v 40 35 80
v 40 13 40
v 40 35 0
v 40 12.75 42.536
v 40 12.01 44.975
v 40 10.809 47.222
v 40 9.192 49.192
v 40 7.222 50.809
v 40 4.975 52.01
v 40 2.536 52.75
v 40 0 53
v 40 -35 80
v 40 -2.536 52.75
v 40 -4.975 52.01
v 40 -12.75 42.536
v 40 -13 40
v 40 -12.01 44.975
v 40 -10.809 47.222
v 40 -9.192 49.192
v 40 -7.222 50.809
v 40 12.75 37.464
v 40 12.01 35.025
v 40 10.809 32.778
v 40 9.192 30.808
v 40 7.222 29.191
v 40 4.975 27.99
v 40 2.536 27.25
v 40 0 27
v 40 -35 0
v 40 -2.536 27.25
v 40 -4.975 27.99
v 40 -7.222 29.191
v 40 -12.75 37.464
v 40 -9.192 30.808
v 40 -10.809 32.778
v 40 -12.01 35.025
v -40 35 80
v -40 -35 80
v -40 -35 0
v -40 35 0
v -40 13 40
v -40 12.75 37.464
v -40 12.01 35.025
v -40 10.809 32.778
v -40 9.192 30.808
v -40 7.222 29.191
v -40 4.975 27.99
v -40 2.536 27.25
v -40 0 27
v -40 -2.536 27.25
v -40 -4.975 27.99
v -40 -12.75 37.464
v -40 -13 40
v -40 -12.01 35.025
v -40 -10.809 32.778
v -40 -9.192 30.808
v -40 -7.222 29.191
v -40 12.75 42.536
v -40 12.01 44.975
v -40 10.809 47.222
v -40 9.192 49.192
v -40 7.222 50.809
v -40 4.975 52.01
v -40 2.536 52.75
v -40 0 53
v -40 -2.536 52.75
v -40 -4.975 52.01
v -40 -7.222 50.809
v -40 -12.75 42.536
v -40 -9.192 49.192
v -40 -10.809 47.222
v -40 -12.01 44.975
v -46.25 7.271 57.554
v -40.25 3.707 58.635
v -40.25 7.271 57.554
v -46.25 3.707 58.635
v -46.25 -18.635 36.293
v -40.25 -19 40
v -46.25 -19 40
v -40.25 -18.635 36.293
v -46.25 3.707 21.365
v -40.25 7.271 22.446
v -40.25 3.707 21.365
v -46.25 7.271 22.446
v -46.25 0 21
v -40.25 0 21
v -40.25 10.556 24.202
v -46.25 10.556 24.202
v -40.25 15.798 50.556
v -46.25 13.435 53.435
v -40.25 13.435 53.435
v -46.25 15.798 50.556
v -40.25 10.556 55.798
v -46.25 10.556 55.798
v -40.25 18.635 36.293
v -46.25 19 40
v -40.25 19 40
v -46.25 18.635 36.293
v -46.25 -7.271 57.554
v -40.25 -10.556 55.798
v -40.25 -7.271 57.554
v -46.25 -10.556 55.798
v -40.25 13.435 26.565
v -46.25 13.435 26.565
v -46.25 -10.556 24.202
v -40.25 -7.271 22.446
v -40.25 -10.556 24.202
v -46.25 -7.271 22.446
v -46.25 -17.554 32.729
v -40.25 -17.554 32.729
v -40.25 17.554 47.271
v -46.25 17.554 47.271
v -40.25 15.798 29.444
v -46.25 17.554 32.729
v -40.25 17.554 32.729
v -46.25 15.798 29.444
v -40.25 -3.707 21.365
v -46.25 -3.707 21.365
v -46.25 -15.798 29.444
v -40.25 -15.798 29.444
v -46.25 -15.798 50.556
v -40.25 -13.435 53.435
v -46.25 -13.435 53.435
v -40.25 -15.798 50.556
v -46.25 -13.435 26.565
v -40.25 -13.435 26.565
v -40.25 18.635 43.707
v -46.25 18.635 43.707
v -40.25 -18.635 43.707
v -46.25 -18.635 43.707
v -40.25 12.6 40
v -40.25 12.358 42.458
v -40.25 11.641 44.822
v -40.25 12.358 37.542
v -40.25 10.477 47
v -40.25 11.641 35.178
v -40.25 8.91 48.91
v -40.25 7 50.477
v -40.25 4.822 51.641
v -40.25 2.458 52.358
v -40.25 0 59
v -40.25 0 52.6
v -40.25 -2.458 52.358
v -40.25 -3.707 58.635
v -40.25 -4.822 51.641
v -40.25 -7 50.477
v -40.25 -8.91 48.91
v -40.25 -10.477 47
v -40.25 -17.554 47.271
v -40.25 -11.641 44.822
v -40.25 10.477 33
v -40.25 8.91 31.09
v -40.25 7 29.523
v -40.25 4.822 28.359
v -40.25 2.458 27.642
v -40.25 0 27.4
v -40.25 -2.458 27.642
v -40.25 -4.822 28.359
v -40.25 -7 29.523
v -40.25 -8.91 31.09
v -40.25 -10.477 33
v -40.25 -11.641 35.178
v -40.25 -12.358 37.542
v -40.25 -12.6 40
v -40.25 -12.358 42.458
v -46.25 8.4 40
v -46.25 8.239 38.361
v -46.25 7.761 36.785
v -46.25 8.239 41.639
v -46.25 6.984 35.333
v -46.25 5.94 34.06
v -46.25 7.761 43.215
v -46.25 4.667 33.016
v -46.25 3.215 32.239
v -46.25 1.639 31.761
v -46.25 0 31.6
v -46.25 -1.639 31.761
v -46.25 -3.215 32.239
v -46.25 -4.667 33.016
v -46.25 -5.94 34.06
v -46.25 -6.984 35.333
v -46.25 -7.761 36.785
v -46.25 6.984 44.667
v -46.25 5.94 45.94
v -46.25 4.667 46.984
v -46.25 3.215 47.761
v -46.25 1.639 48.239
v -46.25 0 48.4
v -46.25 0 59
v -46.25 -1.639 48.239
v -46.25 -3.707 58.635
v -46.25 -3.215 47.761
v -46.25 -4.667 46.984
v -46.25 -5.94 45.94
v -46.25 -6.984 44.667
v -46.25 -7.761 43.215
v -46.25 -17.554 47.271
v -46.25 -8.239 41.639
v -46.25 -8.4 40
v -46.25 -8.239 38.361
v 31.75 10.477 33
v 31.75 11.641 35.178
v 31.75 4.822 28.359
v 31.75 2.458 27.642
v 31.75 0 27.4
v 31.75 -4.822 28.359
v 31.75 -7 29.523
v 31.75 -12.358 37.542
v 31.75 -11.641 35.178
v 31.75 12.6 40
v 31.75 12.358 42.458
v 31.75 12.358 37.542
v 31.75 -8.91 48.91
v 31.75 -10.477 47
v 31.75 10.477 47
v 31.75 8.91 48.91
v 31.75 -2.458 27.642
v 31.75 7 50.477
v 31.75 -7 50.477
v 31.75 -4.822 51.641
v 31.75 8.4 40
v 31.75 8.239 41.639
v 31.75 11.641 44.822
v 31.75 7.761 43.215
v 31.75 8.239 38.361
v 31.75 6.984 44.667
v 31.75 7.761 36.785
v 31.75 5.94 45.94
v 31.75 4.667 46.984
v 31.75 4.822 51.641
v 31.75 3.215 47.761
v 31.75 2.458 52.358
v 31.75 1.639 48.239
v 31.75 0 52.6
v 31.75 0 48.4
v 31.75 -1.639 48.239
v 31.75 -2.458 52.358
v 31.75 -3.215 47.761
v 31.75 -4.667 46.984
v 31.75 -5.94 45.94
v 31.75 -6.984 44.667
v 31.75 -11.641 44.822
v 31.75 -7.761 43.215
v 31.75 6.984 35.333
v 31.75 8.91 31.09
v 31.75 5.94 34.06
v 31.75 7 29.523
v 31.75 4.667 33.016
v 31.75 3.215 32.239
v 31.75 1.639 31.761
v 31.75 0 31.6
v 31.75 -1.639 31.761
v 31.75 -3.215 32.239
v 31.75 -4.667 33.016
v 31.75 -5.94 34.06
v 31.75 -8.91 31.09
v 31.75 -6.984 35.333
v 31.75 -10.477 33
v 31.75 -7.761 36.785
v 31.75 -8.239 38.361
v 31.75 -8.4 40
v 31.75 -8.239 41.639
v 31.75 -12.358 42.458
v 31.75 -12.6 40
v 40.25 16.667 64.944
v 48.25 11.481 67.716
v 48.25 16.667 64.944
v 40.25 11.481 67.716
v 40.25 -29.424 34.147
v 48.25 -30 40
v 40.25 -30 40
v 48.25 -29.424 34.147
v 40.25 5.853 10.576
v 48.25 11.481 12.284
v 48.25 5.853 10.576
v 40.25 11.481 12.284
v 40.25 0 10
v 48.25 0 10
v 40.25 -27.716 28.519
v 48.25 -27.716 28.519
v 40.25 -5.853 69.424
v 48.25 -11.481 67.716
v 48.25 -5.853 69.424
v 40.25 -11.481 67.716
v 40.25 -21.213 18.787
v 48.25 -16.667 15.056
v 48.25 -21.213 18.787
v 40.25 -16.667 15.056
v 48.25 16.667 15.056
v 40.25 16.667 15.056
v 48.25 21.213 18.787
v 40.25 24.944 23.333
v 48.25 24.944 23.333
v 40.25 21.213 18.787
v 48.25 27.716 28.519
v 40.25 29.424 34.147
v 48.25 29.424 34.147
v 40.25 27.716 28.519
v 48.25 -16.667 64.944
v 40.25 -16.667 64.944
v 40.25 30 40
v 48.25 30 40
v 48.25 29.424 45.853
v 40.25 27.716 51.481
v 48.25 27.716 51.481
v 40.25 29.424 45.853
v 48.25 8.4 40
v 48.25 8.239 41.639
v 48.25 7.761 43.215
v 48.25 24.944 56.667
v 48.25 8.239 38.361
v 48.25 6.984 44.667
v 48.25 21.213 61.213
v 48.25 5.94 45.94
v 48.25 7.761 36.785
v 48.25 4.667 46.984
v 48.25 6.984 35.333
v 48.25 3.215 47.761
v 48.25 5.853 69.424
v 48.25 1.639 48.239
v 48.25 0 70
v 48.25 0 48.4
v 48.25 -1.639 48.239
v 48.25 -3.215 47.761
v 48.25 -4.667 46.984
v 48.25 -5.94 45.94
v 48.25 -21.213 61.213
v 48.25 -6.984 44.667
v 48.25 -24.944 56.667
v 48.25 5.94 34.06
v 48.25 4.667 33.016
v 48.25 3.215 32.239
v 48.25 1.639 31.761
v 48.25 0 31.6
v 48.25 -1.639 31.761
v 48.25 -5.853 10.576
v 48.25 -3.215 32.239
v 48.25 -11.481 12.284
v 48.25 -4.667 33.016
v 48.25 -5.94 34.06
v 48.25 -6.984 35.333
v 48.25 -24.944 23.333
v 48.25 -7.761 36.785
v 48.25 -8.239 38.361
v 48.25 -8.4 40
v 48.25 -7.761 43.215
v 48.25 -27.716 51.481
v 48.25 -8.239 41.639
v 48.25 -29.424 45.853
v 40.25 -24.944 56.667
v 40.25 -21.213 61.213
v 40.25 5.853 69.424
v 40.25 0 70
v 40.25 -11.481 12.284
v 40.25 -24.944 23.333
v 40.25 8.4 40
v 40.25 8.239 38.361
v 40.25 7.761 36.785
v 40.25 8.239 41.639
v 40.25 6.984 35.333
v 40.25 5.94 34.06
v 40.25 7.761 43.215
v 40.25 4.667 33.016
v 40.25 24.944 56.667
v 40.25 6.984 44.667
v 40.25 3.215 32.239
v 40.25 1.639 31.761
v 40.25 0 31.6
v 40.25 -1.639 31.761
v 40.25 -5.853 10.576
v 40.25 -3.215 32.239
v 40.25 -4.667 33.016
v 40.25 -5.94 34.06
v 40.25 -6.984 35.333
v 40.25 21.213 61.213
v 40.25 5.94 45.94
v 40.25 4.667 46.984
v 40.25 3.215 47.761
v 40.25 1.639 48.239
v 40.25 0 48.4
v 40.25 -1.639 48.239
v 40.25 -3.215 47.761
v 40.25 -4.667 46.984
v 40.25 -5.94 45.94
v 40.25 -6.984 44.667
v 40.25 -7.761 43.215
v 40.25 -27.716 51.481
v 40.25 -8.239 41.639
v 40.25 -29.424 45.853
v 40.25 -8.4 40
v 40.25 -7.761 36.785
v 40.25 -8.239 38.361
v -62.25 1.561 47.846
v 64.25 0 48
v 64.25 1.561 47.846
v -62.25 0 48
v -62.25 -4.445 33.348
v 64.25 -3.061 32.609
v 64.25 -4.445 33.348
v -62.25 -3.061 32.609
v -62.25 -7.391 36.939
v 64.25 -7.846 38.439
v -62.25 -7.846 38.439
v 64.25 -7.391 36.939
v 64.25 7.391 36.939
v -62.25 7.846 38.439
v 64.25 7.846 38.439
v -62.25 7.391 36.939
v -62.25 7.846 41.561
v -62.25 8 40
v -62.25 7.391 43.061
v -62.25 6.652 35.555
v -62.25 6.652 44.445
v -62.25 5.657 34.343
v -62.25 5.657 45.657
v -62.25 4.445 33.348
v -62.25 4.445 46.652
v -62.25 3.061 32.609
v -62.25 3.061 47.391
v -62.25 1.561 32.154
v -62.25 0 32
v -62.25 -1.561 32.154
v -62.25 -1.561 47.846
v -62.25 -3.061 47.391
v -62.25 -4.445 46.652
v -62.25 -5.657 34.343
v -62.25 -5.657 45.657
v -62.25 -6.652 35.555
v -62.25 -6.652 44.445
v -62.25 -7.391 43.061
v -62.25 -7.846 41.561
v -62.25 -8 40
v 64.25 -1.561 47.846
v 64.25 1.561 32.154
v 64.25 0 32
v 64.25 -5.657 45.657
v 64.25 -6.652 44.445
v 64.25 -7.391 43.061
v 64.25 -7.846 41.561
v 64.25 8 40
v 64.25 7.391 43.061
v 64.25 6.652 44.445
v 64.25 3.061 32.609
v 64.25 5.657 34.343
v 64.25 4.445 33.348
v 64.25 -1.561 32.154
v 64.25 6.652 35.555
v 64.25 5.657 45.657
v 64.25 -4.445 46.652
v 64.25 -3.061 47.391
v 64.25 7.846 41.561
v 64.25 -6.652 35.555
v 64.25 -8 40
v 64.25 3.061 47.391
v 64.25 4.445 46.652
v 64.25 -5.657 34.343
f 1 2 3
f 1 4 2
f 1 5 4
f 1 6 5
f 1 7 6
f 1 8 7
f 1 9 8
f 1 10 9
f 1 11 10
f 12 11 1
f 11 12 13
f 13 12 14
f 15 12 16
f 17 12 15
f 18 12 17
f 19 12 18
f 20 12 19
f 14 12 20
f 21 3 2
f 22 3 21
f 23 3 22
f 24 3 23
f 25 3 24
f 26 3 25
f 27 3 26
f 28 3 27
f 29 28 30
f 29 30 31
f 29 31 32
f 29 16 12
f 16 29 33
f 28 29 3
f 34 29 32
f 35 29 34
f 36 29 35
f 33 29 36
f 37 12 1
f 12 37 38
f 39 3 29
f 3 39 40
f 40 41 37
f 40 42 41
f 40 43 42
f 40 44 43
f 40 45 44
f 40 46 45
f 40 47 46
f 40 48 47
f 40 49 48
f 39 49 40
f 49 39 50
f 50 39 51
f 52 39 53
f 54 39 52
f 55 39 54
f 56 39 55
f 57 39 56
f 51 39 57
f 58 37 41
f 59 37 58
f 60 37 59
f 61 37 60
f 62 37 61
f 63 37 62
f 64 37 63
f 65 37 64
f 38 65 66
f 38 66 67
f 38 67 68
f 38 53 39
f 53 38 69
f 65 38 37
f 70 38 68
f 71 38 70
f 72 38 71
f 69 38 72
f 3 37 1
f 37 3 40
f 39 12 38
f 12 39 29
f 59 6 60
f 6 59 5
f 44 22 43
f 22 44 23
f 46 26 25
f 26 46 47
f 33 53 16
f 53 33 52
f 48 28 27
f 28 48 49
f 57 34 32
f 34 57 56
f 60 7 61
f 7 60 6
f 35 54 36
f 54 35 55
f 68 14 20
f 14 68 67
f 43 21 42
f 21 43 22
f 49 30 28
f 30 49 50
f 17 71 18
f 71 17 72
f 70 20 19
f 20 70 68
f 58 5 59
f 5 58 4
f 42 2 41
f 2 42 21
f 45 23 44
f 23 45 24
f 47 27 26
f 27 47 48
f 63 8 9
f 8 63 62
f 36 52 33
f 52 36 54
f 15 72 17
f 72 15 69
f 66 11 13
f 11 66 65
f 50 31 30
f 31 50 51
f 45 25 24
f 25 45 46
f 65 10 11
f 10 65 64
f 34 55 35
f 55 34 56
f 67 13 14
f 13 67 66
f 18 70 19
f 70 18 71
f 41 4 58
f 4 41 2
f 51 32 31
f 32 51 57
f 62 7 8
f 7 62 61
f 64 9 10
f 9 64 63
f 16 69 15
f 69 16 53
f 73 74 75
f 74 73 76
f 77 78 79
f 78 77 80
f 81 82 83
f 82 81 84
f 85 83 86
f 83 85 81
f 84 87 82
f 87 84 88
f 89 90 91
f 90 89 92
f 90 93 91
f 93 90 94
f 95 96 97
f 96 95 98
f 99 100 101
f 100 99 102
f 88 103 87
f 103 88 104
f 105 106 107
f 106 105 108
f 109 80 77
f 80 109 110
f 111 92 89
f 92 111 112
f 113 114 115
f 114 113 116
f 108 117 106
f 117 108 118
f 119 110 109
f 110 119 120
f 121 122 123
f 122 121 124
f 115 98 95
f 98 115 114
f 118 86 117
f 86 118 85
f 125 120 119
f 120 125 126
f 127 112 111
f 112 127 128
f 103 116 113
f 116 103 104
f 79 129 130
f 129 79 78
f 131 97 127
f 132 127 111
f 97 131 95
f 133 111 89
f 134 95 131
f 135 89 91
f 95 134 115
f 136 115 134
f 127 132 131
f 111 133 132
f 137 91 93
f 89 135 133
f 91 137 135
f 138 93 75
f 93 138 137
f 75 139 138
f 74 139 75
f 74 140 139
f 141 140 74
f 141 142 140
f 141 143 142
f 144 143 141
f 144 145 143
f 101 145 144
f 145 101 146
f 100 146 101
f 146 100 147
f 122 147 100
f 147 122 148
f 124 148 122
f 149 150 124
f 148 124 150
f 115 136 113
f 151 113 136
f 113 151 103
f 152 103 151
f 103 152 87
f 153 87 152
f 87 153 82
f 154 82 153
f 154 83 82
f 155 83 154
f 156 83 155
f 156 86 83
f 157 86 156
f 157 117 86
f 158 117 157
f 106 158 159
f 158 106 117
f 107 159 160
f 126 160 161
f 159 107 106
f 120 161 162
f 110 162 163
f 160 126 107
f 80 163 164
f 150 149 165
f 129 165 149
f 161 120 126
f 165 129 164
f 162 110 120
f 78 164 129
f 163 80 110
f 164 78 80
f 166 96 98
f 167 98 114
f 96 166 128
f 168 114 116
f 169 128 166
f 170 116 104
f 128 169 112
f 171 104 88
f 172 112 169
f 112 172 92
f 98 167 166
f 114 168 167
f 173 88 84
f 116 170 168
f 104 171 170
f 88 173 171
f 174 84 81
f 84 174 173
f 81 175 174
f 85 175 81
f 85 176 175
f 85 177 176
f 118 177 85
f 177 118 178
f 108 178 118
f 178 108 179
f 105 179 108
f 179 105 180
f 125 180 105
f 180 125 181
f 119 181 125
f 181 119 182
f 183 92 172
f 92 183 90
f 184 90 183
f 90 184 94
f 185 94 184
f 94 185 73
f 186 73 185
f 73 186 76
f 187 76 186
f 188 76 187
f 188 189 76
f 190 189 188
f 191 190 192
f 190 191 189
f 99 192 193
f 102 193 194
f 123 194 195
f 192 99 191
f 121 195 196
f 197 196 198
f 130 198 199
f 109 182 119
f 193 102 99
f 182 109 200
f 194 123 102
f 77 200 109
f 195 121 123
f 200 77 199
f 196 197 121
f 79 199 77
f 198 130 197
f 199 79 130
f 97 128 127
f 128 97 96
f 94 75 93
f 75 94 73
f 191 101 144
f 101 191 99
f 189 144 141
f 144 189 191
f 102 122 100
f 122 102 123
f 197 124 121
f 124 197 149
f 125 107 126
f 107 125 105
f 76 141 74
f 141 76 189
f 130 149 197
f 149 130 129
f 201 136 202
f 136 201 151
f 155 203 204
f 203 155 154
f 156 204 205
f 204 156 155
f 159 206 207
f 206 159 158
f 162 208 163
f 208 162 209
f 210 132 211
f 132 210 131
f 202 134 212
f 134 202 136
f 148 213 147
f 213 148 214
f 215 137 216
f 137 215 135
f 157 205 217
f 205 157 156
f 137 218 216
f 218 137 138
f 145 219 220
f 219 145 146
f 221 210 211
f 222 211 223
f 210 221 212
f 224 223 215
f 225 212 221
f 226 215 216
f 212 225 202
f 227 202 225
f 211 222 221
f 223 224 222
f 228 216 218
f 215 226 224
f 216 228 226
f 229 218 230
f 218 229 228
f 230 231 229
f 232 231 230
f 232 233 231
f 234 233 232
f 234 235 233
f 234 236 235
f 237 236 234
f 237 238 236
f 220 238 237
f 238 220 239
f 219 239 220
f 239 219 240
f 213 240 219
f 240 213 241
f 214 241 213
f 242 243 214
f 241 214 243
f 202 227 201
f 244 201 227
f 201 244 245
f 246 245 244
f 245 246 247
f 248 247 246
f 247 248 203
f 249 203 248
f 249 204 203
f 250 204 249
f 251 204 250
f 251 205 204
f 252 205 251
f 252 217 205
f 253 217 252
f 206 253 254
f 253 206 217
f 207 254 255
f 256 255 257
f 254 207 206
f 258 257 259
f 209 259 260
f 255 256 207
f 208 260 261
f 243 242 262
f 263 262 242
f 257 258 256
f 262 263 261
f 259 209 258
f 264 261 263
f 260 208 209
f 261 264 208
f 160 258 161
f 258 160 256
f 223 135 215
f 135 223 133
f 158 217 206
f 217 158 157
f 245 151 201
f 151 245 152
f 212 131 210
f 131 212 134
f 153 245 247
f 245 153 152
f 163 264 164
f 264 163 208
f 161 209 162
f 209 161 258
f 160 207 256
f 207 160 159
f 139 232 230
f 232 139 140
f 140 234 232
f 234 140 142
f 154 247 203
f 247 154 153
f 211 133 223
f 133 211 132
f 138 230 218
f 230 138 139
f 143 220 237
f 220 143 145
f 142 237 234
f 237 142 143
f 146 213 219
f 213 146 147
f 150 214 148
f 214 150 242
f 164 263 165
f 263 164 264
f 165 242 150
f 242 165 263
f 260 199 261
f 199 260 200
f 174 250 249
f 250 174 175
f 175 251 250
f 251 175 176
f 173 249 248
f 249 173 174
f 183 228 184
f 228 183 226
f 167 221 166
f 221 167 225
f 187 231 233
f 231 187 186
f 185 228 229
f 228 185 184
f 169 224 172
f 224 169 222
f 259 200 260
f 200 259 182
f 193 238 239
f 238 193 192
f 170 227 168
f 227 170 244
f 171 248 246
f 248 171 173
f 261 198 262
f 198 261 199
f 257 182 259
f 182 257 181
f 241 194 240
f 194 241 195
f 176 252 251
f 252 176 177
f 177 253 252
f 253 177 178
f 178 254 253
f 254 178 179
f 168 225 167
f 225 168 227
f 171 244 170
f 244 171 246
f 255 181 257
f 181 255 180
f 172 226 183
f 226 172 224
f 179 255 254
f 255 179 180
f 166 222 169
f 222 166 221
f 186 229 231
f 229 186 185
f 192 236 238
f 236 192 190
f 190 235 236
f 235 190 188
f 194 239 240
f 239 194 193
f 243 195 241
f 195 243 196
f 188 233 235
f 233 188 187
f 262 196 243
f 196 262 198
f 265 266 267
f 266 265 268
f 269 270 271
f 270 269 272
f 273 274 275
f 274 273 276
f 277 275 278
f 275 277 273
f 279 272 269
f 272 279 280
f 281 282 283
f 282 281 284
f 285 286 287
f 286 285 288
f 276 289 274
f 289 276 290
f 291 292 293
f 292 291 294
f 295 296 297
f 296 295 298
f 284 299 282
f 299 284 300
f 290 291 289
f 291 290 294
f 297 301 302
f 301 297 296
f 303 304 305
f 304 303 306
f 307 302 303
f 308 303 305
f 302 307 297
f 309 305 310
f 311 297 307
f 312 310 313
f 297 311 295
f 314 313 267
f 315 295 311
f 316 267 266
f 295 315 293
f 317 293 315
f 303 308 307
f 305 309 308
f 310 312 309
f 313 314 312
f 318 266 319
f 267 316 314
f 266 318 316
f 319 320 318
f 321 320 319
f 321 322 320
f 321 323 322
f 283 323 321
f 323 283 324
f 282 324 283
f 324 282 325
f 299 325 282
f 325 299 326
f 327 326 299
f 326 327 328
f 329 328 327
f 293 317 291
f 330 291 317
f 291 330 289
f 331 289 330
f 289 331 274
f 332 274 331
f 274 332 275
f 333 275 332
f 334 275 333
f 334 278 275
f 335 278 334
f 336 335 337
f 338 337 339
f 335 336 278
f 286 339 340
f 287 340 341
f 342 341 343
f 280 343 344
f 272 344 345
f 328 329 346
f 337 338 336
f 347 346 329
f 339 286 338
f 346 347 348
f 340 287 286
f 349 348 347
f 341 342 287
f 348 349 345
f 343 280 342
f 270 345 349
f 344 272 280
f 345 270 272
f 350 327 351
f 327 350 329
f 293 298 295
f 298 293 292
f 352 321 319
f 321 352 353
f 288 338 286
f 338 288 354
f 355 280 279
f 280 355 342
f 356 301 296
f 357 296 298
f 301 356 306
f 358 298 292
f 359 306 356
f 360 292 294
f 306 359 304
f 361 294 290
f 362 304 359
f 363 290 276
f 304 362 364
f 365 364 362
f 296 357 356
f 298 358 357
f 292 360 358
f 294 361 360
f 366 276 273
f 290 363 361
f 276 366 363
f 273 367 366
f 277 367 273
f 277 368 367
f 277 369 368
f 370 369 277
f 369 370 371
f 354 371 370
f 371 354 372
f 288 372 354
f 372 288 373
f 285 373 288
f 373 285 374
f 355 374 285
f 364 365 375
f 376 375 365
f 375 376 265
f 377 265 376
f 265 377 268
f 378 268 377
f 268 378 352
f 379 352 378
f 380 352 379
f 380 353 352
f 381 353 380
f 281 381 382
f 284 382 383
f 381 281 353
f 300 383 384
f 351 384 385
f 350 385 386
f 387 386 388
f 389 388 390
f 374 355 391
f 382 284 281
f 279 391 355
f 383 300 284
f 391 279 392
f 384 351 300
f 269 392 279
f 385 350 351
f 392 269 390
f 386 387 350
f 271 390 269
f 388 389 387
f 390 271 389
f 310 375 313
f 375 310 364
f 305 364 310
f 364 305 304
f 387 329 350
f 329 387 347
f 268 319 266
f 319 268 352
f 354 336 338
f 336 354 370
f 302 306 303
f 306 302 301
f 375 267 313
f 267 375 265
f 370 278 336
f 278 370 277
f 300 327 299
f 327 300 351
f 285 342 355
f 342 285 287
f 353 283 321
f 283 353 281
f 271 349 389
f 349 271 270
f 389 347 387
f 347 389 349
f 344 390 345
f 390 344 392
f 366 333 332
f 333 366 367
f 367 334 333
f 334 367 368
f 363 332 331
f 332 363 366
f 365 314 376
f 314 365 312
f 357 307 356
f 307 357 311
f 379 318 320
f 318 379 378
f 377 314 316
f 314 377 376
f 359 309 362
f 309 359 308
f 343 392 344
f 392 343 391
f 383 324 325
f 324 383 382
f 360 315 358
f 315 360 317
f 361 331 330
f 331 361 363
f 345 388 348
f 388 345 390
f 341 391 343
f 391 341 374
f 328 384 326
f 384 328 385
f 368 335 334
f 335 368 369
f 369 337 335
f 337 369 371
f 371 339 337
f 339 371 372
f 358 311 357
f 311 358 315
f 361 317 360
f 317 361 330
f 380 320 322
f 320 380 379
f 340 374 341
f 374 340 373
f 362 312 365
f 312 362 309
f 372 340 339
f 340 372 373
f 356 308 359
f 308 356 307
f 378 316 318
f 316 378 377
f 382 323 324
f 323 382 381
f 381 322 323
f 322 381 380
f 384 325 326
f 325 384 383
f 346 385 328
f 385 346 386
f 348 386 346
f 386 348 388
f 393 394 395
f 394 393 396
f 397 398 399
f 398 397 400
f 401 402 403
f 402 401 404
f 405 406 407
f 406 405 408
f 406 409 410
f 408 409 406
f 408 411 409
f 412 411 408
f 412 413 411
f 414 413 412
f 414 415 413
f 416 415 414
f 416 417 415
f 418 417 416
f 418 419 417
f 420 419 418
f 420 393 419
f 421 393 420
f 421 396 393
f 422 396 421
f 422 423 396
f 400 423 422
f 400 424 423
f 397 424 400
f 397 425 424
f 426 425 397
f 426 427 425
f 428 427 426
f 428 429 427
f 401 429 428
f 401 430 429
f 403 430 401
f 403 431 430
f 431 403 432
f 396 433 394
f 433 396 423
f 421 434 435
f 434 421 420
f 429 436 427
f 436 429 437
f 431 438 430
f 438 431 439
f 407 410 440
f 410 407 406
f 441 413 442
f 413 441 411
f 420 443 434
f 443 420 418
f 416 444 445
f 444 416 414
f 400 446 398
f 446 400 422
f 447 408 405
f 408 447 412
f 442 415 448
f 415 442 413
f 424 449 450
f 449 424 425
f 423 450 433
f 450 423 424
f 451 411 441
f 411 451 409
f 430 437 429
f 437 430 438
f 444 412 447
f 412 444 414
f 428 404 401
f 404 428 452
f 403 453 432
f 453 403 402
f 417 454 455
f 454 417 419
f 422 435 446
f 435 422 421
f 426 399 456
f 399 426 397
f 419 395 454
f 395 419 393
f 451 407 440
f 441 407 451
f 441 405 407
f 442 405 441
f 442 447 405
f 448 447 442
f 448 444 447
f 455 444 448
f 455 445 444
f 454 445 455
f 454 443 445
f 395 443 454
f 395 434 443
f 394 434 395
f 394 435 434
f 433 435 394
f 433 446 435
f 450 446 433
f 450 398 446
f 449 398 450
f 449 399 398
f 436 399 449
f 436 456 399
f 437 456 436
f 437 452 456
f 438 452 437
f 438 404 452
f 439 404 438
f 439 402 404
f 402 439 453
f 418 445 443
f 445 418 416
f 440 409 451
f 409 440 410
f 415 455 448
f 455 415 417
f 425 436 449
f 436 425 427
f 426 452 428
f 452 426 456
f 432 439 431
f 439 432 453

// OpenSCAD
$fn = 32;

// ------------------------------------------------------------------------
// Bushed housing: 80 x 70 x 80 mm housing, bushing d25.2
// Every part is its own module, assembly() places them once.
// ------------------------------------------------------------------------

// --- part 1 ---
module housing() {
  difference() {
    translate([-40, -35, 0]) cube([80, 70, 80]);
    translate([0, 0, 40]) rotate([0, 90, 0]) cylinder(h = 82, d = 26, center = true);
  }
}

// --- part 2 ---
module bushing() {
  difference() {
    union() {
      cylinder(h = 6, d = 38);
      translate([0, 0, 6]) cylinder(h = 72, d = 25.2);
    }
    translate([0, 0, -1]) cylinder(h = 80, d = 16.8);
  }
}

// --- part 3 ---
module shaft() {
  translate([0, 0, -63.25]) cylinder(h = 126.5, d = 16);
}

// --- part 4 ---
module cover() {
  difference() {
    cylinder(h = 8, d = 60);
    translate([0, 0, -1]) cylinder(h = 10, d = 16.8);
  }
}

// --- assembly ---
module assembly() {
  translate([0, 0, 0]) rotate([0, 0, 0]) housing();
  translate([-46.25, 0, 40]) rotate([0, 90, 0]) bushing();
  translate([1, 0, 40]) rotate([0, 90, 0]) shaft();
  translate([40.25, 0, 40]) rotate([0, 90, 0]) cover();
}

assembly();
